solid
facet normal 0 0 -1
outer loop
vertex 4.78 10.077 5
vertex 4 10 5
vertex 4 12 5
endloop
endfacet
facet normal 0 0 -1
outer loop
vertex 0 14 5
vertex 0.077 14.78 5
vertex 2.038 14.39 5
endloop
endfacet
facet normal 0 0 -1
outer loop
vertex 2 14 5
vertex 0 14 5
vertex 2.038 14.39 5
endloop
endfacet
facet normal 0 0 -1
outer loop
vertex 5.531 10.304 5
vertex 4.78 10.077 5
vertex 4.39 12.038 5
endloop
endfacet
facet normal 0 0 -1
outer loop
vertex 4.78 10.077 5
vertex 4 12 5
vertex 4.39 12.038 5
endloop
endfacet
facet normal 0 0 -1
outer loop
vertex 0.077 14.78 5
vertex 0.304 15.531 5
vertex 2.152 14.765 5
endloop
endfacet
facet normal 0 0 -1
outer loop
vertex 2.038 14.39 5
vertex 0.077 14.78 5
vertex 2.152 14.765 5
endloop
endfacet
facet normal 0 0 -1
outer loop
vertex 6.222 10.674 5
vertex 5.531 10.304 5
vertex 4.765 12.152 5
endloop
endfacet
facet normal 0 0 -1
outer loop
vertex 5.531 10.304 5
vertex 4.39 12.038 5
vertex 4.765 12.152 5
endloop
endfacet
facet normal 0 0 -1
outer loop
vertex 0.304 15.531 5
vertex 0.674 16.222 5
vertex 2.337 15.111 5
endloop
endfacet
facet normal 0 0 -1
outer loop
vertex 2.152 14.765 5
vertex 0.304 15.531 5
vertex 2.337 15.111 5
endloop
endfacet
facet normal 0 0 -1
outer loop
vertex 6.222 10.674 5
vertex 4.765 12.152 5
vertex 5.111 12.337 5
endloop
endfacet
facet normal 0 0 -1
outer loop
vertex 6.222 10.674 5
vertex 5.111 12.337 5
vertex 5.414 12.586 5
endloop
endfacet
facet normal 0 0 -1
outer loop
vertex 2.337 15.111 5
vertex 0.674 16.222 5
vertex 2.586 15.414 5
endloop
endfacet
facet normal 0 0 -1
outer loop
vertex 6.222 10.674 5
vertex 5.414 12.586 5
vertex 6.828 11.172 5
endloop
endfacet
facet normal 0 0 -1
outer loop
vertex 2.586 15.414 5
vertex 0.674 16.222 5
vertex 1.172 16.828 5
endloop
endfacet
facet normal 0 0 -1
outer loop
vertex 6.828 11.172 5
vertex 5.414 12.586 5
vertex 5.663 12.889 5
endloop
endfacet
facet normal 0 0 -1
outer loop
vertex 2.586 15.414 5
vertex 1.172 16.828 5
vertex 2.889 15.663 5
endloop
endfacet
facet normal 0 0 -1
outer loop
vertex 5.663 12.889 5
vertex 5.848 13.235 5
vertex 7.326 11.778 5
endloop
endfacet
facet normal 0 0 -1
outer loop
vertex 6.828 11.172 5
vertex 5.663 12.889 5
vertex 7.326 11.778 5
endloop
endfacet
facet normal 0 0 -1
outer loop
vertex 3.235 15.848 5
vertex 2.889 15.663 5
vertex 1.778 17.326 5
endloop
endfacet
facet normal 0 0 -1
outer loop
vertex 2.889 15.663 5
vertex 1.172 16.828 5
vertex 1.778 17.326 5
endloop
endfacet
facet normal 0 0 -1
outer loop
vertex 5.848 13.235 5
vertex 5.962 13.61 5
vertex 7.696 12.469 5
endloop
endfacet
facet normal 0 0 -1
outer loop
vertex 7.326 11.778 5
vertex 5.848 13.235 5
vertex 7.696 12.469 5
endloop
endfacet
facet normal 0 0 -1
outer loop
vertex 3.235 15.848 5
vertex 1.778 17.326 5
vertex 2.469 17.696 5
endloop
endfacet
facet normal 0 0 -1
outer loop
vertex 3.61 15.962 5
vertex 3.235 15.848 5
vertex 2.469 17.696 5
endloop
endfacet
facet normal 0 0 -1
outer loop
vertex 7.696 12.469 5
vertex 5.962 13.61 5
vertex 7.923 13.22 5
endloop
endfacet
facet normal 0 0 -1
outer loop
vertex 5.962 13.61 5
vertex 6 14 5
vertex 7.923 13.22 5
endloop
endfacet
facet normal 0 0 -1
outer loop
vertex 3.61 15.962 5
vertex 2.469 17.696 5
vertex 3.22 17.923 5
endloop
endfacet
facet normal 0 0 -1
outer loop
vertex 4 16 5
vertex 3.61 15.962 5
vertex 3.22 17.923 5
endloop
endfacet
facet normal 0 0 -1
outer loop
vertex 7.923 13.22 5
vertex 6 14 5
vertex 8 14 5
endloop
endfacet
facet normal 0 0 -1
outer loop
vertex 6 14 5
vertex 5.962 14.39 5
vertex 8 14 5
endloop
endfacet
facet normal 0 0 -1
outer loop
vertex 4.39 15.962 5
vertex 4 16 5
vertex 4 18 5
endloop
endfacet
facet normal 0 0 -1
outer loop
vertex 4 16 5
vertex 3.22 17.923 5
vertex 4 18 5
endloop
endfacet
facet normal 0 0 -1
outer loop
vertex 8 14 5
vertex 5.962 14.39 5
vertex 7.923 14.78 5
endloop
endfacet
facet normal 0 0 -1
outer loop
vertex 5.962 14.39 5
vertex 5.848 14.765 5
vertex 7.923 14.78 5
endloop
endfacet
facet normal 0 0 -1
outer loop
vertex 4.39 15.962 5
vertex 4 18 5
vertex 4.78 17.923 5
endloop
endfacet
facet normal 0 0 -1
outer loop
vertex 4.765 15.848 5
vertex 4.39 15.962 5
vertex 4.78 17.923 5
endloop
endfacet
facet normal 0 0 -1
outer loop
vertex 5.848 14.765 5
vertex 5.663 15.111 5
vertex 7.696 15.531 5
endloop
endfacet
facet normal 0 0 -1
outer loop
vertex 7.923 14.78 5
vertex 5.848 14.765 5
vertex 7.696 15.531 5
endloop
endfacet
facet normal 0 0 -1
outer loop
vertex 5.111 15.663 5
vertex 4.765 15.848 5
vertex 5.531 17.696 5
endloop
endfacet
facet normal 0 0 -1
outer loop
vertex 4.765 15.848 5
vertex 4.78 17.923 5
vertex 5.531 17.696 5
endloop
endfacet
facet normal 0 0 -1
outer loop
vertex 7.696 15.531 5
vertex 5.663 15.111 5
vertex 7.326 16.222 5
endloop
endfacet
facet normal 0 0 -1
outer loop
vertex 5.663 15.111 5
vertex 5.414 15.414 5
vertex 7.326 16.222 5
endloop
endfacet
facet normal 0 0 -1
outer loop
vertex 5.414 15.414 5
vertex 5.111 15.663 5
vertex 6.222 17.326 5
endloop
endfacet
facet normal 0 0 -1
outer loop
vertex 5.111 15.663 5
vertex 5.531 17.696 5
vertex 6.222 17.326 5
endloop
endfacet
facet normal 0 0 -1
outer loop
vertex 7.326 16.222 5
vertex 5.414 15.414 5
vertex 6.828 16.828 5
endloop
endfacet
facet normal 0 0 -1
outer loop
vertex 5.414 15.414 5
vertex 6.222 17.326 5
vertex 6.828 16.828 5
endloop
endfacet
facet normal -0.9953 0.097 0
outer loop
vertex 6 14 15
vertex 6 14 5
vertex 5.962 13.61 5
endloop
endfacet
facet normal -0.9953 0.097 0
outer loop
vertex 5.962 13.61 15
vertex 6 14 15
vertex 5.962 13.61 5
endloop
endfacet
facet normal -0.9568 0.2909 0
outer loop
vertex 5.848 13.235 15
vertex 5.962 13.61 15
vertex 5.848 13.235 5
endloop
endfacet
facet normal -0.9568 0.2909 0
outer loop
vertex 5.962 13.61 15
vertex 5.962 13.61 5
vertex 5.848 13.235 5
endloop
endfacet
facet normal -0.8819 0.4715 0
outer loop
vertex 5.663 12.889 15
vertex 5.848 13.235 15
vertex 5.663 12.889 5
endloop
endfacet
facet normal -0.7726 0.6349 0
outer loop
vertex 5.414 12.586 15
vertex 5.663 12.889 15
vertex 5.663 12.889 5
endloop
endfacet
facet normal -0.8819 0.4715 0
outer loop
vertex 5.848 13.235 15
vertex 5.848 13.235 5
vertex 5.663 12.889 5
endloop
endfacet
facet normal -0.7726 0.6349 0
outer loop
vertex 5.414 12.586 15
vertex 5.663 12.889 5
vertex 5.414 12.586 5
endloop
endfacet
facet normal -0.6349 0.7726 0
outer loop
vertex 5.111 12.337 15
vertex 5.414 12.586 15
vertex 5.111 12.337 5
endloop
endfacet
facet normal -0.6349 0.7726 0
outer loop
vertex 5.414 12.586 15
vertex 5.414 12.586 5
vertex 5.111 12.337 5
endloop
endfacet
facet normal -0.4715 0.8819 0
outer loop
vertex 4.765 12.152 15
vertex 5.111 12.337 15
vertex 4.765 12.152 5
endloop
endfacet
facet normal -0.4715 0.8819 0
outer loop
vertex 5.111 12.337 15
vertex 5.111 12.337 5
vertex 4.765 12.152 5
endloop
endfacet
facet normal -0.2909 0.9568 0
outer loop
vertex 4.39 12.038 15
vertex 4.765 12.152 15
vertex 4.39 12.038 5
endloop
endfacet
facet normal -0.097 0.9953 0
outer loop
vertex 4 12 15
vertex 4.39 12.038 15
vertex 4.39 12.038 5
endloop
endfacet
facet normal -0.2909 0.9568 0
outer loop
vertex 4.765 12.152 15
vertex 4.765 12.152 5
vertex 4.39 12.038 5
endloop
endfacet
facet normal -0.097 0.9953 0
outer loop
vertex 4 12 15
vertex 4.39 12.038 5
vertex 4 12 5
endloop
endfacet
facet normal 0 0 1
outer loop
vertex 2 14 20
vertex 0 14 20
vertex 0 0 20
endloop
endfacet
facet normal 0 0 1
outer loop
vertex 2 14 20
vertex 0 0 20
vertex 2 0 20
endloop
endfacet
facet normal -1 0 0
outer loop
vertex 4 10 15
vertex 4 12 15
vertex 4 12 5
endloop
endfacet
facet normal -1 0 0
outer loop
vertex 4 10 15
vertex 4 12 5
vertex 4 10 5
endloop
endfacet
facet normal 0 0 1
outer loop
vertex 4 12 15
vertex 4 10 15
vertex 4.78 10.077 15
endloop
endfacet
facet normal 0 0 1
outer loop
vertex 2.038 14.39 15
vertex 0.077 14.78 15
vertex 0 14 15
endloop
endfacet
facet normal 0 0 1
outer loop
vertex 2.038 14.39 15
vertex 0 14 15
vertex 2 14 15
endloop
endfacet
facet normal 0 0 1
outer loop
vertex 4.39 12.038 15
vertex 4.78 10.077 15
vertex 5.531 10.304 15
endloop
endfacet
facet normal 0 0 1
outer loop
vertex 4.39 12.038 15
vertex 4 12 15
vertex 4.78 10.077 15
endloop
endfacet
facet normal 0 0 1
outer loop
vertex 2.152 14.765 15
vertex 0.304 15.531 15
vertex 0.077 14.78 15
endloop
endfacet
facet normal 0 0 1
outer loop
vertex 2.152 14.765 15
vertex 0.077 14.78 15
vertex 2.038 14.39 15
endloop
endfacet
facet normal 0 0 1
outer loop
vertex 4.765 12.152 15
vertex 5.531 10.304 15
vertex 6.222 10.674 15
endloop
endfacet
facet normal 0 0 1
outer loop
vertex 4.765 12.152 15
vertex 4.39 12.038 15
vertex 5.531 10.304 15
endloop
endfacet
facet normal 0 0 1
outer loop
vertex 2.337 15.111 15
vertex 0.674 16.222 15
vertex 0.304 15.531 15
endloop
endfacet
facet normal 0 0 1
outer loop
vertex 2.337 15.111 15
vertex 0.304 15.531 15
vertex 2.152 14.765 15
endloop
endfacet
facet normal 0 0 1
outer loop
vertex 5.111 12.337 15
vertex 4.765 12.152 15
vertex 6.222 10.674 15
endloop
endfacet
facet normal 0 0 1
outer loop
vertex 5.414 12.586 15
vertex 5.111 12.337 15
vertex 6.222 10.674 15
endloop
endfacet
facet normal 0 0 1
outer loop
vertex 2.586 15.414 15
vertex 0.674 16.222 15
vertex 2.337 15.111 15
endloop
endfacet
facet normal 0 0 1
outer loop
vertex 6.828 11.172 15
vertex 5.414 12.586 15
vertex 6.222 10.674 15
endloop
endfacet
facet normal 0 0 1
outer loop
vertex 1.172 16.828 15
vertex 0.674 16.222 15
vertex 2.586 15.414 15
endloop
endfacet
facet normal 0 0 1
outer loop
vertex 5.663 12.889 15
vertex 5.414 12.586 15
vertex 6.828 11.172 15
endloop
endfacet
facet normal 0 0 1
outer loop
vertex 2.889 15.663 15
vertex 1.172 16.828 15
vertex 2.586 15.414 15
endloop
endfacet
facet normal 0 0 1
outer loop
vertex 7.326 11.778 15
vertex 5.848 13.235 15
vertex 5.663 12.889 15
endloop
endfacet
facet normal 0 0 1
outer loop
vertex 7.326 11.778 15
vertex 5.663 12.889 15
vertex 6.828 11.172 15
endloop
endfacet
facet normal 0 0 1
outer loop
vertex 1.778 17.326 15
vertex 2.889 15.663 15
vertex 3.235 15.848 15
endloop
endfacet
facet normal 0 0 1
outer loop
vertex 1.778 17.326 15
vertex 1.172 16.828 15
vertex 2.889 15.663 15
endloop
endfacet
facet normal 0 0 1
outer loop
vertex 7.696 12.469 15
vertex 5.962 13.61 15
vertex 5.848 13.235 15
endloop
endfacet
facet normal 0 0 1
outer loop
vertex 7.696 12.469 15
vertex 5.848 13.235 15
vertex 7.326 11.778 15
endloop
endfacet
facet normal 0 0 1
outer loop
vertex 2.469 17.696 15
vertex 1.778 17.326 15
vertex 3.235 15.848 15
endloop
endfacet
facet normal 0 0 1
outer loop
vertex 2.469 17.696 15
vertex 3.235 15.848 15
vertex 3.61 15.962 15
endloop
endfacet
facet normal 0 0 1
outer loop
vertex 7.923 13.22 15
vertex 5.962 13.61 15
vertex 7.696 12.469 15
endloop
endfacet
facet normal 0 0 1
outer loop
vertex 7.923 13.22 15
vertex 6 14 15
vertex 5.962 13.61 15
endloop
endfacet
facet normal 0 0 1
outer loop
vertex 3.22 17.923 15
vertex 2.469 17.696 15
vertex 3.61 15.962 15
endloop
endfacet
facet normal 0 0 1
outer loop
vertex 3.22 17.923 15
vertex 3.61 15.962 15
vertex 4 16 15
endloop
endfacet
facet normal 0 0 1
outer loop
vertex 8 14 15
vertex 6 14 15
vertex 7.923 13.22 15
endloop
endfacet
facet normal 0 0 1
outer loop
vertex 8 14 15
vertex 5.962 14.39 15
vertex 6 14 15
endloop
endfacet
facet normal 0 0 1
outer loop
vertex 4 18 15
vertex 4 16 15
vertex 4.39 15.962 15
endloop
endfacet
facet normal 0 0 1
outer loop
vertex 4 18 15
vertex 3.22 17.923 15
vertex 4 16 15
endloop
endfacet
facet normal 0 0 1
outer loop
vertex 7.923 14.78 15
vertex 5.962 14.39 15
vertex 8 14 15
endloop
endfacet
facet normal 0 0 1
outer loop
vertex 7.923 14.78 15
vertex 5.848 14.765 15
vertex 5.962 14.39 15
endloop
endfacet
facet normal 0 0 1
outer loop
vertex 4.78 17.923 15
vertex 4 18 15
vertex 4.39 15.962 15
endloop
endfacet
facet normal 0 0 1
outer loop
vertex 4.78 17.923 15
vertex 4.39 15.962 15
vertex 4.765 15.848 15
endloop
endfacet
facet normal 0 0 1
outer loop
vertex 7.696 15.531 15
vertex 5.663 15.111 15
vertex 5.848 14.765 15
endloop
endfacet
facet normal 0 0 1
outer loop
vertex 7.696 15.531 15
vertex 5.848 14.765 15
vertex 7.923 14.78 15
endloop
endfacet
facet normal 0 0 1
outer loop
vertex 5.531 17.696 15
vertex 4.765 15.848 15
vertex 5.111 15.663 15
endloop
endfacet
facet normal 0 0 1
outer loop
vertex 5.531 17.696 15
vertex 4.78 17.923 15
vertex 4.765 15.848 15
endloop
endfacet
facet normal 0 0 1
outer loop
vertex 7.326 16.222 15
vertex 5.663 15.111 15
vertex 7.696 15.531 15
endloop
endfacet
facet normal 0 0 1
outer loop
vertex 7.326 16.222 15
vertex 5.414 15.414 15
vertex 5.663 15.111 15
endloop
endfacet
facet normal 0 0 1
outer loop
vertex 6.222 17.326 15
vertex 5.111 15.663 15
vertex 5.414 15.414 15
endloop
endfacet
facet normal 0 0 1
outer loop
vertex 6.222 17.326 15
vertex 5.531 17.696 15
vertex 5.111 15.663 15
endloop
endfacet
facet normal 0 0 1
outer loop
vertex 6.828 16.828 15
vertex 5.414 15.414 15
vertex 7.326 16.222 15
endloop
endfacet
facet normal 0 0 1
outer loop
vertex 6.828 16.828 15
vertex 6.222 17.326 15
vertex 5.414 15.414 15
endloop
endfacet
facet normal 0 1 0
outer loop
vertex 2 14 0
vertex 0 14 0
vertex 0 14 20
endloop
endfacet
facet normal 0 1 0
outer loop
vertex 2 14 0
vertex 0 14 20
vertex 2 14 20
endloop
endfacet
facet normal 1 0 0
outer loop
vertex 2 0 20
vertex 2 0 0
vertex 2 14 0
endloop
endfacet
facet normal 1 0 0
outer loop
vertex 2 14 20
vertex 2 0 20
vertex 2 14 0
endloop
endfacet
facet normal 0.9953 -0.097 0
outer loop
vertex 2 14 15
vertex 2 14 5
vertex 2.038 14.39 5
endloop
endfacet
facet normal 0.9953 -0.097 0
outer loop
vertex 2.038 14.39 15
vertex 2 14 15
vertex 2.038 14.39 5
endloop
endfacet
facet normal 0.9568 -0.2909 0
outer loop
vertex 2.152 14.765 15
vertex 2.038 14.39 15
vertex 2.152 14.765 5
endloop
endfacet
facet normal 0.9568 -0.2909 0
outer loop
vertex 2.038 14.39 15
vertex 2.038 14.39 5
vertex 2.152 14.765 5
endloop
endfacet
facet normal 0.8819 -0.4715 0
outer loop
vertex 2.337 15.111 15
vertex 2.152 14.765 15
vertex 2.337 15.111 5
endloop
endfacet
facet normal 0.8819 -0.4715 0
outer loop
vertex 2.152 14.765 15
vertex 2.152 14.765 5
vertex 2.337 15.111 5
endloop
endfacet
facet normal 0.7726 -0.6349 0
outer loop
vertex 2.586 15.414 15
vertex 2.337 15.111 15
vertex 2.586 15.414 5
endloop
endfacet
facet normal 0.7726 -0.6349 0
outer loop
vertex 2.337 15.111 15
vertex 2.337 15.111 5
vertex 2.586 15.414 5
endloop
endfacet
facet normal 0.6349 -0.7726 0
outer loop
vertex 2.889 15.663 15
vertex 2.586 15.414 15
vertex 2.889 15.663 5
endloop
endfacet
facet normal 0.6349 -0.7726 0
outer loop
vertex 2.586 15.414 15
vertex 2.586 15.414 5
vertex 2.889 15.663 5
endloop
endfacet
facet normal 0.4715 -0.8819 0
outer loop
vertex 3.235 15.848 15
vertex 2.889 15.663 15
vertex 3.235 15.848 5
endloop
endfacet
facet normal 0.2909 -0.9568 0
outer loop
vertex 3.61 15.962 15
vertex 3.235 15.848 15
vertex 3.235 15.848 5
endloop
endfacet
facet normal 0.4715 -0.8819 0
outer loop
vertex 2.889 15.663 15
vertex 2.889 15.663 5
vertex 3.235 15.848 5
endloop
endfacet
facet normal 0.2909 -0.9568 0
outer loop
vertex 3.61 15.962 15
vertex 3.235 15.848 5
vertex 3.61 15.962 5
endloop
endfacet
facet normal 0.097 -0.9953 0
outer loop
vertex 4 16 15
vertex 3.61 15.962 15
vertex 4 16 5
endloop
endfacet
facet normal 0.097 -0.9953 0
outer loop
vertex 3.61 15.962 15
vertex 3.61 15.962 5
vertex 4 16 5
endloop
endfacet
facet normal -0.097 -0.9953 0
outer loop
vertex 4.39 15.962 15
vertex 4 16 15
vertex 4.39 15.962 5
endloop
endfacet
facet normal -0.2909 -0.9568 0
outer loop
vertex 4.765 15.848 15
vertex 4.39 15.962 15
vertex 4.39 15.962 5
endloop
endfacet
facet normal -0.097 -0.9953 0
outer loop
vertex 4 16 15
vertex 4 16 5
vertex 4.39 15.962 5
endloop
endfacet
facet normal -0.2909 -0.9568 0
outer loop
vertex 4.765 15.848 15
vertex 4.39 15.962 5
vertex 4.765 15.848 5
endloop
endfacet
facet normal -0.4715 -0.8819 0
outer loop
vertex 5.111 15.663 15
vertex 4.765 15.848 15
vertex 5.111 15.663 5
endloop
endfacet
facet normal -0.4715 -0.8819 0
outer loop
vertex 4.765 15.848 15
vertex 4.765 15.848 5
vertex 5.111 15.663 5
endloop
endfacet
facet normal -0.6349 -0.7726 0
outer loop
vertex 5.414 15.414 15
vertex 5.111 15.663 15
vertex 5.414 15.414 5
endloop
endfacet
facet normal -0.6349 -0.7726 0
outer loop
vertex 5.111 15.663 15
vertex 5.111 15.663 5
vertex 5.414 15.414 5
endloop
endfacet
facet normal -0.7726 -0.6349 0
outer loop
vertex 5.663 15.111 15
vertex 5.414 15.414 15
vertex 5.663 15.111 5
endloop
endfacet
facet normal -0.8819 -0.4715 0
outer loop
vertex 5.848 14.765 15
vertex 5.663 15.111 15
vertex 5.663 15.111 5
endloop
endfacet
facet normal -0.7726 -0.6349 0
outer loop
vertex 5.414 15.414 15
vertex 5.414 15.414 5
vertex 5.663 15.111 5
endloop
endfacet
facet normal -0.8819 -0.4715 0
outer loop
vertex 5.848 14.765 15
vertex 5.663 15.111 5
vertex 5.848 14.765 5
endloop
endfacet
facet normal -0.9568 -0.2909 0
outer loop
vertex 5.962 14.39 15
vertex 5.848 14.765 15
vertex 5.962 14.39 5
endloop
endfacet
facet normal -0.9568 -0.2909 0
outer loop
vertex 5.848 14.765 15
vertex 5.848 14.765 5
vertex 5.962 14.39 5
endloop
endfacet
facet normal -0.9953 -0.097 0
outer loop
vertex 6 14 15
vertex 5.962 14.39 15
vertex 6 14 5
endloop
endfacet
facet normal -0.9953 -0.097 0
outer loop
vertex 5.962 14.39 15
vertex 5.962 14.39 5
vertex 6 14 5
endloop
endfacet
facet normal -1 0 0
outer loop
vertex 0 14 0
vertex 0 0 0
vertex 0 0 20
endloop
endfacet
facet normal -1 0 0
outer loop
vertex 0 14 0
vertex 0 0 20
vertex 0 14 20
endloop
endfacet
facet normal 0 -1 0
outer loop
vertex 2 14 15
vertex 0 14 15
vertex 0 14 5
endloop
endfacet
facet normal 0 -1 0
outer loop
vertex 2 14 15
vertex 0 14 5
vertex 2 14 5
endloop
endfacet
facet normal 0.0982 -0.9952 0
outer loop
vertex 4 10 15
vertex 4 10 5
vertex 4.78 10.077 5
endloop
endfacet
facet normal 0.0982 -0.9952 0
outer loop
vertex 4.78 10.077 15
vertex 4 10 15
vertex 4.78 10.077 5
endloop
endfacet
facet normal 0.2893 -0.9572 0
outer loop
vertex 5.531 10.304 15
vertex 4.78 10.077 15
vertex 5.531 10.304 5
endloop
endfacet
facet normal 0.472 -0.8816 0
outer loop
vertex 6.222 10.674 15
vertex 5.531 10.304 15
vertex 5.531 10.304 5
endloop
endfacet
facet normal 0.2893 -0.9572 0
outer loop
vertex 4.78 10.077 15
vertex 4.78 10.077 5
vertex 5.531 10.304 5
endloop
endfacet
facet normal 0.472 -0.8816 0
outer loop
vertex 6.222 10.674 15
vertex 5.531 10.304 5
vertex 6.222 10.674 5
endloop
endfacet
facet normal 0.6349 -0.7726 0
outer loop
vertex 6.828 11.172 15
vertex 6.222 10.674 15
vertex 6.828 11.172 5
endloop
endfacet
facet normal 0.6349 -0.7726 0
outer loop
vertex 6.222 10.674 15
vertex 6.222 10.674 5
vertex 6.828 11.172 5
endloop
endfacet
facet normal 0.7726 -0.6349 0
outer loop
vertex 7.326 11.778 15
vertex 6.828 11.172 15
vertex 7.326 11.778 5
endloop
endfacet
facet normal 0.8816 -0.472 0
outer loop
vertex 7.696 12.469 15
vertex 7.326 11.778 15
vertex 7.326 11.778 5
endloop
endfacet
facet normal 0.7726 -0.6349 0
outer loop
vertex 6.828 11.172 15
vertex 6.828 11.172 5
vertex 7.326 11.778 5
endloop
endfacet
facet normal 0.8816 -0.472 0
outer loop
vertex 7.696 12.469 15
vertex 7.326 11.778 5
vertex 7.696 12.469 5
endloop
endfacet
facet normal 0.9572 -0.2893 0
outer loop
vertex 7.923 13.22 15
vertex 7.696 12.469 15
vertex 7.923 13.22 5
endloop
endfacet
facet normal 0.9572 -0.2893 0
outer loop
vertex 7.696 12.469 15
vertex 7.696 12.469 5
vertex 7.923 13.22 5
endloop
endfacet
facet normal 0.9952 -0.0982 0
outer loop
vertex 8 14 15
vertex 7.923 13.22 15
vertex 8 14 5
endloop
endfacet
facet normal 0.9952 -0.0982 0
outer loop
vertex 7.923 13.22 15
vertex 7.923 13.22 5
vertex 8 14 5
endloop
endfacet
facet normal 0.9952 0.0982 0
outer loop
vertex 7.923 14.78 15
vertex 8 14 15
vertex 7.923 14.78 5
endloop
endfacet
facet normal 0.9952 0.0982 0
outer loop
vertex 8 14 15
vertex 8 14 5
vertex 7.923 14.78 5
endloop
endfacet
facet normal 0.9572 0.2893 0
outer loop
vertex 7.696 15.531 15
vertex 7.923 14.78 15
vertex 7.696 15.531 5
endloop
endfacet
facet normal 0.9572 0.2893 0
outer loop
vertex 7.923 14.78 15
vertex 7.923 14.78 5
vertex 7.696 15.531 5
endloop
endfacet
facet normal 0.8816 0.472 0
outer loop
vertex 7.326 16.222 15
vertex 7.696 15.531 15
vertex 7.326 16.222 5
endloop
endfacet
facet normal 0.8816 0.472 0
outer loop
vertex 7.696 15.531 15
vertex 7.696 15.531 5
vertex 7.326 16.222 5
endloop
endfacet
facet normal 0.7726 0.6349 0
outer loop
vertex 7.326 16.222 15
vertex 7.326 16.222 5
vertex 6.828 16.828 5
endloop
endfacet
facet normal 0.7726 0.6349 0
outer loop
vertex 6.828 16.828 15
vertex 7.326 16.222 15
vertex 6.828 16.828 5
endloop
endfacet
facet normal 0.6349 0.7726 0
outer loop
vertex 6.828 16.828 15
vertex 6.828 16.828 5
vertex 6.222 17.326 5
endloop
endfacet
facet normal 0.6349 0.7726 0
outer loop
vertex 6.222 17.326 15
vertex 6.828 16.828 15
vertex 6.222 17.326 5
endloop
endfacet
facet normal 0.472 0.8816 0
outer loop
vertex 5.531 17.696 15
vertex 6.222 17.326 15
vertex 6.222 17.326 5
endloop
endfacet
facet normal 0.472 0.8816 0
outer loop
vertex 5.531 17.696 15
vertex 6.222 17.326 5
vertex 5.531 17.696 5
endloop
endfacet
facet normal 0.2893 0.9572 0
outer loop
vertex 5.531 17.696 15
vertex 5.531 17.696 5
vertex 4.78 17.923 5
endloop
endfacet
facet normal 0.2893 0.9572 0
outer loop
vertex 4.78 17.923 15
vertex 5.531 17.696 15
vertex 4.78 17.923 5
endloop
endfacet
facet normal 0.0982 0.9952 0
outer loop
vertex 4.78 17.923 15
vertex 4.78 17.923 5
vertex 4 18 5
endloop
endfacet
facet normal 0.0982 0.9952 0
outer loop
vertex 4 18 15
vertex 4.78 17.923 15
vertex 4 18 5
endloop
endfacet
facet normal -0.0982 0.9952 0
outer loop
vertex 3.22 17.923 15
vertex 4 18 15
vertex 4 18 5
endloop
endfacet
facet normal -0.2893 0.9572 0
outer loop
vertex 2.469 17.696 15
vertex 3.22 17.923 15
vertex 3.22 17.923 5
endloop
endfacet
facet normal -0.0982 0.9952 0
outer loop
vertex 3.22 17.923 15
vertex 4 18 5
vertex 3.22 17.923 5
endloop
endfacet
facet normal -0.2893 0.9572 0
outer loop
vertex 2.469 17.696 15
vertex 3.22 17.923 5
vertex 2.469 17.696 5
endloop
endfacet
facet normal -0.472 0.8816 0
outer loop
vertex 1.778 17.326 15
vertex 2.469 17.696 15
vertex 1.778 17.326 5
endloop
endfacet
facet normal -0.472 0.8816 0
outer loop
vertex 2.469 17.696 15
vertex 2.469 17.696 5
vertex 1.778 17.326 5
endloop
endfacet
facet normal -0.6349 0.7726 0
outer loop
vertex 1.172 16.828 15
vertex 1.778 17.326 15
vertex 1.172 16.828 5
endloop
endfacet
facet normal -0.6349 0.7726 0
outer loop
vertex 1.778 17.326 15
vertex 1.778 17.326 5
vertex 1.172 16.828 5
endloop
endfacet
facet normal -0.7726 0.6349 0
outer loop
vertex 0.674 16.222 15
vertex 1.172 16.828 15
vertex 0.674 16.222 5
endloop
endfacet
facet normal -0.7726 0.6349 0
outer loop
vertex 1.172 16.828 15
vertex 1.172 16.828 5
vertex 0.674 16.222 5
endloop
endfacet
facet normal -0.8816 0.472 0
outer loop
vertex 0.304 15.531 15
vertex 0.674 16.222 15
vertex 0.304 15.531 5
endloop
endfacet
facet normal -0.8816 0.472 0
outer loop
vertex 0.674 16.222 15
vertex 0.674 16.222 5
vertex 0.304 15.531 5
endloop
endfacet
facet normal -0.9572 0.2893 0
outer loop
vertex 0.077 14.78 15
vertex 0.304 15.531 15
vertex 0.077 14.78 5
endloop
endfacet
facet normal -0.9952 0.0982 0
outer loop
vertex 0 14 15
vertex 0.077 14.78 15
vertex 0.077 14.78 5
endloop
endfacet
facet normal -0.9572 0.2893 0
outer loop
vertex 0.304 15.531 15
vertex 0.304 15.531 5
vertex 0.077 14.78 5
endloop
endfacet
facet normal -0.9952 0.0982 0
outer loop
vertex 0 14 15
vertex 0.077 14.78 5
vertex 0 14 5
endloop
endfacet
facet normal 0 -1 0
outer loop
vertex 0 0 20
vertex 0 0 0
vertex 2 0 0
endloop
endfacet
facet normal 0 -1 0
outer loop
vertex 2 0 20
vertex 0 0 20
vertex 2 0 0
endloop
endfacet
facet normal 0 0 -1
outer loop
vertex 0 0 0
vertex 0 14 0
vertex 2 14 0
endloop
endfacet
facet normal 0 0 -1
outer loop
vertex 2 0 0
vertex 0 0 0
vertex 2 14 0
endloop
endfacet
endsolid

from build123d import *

# Parameters (mm, degrees)
BOSS_EXTRUDE1_DEPTH = 20
BOSS_EXTRUDE2_START = 5
BOSS_EXTRUDE2_DEPTH = 10


with BuildPart() as part:
    # Sketch2 → Boss-Extrude1 (new body)
    with BuildSketch(Plane.XY):
        Polygon((0, 14), (0, 0), (2, 0), (2, 10.535898385), (2, 14), align=None)
    extrude(amount=BOSS_EXTRUDE1_DEPTH)


with BuildPart() as body_2:
    # Sketch2<8> → Boss-Extrude2 (new body)
    with BuildSketch(Plane.XY.offset(BOSS_EXTRUDE2_START)):
        with BuildLine():
            ThreePointArc((4, 10), (6.828427125, 16.828427125), (0, 14))
            Line((0, 14), (2, 14))
            ThreePointArc((2, 14), (4, 16), (6, 14))
            ThreePointArc((6, 14), (5.414213562, 12.585786438), (4, 12))
            Line((4, 12), (4, 10))
        make_face()
    extrude(amount=BOSS_EXTRUDE2_DEPTH)


solid = Compound([part.part, body_2.part])
